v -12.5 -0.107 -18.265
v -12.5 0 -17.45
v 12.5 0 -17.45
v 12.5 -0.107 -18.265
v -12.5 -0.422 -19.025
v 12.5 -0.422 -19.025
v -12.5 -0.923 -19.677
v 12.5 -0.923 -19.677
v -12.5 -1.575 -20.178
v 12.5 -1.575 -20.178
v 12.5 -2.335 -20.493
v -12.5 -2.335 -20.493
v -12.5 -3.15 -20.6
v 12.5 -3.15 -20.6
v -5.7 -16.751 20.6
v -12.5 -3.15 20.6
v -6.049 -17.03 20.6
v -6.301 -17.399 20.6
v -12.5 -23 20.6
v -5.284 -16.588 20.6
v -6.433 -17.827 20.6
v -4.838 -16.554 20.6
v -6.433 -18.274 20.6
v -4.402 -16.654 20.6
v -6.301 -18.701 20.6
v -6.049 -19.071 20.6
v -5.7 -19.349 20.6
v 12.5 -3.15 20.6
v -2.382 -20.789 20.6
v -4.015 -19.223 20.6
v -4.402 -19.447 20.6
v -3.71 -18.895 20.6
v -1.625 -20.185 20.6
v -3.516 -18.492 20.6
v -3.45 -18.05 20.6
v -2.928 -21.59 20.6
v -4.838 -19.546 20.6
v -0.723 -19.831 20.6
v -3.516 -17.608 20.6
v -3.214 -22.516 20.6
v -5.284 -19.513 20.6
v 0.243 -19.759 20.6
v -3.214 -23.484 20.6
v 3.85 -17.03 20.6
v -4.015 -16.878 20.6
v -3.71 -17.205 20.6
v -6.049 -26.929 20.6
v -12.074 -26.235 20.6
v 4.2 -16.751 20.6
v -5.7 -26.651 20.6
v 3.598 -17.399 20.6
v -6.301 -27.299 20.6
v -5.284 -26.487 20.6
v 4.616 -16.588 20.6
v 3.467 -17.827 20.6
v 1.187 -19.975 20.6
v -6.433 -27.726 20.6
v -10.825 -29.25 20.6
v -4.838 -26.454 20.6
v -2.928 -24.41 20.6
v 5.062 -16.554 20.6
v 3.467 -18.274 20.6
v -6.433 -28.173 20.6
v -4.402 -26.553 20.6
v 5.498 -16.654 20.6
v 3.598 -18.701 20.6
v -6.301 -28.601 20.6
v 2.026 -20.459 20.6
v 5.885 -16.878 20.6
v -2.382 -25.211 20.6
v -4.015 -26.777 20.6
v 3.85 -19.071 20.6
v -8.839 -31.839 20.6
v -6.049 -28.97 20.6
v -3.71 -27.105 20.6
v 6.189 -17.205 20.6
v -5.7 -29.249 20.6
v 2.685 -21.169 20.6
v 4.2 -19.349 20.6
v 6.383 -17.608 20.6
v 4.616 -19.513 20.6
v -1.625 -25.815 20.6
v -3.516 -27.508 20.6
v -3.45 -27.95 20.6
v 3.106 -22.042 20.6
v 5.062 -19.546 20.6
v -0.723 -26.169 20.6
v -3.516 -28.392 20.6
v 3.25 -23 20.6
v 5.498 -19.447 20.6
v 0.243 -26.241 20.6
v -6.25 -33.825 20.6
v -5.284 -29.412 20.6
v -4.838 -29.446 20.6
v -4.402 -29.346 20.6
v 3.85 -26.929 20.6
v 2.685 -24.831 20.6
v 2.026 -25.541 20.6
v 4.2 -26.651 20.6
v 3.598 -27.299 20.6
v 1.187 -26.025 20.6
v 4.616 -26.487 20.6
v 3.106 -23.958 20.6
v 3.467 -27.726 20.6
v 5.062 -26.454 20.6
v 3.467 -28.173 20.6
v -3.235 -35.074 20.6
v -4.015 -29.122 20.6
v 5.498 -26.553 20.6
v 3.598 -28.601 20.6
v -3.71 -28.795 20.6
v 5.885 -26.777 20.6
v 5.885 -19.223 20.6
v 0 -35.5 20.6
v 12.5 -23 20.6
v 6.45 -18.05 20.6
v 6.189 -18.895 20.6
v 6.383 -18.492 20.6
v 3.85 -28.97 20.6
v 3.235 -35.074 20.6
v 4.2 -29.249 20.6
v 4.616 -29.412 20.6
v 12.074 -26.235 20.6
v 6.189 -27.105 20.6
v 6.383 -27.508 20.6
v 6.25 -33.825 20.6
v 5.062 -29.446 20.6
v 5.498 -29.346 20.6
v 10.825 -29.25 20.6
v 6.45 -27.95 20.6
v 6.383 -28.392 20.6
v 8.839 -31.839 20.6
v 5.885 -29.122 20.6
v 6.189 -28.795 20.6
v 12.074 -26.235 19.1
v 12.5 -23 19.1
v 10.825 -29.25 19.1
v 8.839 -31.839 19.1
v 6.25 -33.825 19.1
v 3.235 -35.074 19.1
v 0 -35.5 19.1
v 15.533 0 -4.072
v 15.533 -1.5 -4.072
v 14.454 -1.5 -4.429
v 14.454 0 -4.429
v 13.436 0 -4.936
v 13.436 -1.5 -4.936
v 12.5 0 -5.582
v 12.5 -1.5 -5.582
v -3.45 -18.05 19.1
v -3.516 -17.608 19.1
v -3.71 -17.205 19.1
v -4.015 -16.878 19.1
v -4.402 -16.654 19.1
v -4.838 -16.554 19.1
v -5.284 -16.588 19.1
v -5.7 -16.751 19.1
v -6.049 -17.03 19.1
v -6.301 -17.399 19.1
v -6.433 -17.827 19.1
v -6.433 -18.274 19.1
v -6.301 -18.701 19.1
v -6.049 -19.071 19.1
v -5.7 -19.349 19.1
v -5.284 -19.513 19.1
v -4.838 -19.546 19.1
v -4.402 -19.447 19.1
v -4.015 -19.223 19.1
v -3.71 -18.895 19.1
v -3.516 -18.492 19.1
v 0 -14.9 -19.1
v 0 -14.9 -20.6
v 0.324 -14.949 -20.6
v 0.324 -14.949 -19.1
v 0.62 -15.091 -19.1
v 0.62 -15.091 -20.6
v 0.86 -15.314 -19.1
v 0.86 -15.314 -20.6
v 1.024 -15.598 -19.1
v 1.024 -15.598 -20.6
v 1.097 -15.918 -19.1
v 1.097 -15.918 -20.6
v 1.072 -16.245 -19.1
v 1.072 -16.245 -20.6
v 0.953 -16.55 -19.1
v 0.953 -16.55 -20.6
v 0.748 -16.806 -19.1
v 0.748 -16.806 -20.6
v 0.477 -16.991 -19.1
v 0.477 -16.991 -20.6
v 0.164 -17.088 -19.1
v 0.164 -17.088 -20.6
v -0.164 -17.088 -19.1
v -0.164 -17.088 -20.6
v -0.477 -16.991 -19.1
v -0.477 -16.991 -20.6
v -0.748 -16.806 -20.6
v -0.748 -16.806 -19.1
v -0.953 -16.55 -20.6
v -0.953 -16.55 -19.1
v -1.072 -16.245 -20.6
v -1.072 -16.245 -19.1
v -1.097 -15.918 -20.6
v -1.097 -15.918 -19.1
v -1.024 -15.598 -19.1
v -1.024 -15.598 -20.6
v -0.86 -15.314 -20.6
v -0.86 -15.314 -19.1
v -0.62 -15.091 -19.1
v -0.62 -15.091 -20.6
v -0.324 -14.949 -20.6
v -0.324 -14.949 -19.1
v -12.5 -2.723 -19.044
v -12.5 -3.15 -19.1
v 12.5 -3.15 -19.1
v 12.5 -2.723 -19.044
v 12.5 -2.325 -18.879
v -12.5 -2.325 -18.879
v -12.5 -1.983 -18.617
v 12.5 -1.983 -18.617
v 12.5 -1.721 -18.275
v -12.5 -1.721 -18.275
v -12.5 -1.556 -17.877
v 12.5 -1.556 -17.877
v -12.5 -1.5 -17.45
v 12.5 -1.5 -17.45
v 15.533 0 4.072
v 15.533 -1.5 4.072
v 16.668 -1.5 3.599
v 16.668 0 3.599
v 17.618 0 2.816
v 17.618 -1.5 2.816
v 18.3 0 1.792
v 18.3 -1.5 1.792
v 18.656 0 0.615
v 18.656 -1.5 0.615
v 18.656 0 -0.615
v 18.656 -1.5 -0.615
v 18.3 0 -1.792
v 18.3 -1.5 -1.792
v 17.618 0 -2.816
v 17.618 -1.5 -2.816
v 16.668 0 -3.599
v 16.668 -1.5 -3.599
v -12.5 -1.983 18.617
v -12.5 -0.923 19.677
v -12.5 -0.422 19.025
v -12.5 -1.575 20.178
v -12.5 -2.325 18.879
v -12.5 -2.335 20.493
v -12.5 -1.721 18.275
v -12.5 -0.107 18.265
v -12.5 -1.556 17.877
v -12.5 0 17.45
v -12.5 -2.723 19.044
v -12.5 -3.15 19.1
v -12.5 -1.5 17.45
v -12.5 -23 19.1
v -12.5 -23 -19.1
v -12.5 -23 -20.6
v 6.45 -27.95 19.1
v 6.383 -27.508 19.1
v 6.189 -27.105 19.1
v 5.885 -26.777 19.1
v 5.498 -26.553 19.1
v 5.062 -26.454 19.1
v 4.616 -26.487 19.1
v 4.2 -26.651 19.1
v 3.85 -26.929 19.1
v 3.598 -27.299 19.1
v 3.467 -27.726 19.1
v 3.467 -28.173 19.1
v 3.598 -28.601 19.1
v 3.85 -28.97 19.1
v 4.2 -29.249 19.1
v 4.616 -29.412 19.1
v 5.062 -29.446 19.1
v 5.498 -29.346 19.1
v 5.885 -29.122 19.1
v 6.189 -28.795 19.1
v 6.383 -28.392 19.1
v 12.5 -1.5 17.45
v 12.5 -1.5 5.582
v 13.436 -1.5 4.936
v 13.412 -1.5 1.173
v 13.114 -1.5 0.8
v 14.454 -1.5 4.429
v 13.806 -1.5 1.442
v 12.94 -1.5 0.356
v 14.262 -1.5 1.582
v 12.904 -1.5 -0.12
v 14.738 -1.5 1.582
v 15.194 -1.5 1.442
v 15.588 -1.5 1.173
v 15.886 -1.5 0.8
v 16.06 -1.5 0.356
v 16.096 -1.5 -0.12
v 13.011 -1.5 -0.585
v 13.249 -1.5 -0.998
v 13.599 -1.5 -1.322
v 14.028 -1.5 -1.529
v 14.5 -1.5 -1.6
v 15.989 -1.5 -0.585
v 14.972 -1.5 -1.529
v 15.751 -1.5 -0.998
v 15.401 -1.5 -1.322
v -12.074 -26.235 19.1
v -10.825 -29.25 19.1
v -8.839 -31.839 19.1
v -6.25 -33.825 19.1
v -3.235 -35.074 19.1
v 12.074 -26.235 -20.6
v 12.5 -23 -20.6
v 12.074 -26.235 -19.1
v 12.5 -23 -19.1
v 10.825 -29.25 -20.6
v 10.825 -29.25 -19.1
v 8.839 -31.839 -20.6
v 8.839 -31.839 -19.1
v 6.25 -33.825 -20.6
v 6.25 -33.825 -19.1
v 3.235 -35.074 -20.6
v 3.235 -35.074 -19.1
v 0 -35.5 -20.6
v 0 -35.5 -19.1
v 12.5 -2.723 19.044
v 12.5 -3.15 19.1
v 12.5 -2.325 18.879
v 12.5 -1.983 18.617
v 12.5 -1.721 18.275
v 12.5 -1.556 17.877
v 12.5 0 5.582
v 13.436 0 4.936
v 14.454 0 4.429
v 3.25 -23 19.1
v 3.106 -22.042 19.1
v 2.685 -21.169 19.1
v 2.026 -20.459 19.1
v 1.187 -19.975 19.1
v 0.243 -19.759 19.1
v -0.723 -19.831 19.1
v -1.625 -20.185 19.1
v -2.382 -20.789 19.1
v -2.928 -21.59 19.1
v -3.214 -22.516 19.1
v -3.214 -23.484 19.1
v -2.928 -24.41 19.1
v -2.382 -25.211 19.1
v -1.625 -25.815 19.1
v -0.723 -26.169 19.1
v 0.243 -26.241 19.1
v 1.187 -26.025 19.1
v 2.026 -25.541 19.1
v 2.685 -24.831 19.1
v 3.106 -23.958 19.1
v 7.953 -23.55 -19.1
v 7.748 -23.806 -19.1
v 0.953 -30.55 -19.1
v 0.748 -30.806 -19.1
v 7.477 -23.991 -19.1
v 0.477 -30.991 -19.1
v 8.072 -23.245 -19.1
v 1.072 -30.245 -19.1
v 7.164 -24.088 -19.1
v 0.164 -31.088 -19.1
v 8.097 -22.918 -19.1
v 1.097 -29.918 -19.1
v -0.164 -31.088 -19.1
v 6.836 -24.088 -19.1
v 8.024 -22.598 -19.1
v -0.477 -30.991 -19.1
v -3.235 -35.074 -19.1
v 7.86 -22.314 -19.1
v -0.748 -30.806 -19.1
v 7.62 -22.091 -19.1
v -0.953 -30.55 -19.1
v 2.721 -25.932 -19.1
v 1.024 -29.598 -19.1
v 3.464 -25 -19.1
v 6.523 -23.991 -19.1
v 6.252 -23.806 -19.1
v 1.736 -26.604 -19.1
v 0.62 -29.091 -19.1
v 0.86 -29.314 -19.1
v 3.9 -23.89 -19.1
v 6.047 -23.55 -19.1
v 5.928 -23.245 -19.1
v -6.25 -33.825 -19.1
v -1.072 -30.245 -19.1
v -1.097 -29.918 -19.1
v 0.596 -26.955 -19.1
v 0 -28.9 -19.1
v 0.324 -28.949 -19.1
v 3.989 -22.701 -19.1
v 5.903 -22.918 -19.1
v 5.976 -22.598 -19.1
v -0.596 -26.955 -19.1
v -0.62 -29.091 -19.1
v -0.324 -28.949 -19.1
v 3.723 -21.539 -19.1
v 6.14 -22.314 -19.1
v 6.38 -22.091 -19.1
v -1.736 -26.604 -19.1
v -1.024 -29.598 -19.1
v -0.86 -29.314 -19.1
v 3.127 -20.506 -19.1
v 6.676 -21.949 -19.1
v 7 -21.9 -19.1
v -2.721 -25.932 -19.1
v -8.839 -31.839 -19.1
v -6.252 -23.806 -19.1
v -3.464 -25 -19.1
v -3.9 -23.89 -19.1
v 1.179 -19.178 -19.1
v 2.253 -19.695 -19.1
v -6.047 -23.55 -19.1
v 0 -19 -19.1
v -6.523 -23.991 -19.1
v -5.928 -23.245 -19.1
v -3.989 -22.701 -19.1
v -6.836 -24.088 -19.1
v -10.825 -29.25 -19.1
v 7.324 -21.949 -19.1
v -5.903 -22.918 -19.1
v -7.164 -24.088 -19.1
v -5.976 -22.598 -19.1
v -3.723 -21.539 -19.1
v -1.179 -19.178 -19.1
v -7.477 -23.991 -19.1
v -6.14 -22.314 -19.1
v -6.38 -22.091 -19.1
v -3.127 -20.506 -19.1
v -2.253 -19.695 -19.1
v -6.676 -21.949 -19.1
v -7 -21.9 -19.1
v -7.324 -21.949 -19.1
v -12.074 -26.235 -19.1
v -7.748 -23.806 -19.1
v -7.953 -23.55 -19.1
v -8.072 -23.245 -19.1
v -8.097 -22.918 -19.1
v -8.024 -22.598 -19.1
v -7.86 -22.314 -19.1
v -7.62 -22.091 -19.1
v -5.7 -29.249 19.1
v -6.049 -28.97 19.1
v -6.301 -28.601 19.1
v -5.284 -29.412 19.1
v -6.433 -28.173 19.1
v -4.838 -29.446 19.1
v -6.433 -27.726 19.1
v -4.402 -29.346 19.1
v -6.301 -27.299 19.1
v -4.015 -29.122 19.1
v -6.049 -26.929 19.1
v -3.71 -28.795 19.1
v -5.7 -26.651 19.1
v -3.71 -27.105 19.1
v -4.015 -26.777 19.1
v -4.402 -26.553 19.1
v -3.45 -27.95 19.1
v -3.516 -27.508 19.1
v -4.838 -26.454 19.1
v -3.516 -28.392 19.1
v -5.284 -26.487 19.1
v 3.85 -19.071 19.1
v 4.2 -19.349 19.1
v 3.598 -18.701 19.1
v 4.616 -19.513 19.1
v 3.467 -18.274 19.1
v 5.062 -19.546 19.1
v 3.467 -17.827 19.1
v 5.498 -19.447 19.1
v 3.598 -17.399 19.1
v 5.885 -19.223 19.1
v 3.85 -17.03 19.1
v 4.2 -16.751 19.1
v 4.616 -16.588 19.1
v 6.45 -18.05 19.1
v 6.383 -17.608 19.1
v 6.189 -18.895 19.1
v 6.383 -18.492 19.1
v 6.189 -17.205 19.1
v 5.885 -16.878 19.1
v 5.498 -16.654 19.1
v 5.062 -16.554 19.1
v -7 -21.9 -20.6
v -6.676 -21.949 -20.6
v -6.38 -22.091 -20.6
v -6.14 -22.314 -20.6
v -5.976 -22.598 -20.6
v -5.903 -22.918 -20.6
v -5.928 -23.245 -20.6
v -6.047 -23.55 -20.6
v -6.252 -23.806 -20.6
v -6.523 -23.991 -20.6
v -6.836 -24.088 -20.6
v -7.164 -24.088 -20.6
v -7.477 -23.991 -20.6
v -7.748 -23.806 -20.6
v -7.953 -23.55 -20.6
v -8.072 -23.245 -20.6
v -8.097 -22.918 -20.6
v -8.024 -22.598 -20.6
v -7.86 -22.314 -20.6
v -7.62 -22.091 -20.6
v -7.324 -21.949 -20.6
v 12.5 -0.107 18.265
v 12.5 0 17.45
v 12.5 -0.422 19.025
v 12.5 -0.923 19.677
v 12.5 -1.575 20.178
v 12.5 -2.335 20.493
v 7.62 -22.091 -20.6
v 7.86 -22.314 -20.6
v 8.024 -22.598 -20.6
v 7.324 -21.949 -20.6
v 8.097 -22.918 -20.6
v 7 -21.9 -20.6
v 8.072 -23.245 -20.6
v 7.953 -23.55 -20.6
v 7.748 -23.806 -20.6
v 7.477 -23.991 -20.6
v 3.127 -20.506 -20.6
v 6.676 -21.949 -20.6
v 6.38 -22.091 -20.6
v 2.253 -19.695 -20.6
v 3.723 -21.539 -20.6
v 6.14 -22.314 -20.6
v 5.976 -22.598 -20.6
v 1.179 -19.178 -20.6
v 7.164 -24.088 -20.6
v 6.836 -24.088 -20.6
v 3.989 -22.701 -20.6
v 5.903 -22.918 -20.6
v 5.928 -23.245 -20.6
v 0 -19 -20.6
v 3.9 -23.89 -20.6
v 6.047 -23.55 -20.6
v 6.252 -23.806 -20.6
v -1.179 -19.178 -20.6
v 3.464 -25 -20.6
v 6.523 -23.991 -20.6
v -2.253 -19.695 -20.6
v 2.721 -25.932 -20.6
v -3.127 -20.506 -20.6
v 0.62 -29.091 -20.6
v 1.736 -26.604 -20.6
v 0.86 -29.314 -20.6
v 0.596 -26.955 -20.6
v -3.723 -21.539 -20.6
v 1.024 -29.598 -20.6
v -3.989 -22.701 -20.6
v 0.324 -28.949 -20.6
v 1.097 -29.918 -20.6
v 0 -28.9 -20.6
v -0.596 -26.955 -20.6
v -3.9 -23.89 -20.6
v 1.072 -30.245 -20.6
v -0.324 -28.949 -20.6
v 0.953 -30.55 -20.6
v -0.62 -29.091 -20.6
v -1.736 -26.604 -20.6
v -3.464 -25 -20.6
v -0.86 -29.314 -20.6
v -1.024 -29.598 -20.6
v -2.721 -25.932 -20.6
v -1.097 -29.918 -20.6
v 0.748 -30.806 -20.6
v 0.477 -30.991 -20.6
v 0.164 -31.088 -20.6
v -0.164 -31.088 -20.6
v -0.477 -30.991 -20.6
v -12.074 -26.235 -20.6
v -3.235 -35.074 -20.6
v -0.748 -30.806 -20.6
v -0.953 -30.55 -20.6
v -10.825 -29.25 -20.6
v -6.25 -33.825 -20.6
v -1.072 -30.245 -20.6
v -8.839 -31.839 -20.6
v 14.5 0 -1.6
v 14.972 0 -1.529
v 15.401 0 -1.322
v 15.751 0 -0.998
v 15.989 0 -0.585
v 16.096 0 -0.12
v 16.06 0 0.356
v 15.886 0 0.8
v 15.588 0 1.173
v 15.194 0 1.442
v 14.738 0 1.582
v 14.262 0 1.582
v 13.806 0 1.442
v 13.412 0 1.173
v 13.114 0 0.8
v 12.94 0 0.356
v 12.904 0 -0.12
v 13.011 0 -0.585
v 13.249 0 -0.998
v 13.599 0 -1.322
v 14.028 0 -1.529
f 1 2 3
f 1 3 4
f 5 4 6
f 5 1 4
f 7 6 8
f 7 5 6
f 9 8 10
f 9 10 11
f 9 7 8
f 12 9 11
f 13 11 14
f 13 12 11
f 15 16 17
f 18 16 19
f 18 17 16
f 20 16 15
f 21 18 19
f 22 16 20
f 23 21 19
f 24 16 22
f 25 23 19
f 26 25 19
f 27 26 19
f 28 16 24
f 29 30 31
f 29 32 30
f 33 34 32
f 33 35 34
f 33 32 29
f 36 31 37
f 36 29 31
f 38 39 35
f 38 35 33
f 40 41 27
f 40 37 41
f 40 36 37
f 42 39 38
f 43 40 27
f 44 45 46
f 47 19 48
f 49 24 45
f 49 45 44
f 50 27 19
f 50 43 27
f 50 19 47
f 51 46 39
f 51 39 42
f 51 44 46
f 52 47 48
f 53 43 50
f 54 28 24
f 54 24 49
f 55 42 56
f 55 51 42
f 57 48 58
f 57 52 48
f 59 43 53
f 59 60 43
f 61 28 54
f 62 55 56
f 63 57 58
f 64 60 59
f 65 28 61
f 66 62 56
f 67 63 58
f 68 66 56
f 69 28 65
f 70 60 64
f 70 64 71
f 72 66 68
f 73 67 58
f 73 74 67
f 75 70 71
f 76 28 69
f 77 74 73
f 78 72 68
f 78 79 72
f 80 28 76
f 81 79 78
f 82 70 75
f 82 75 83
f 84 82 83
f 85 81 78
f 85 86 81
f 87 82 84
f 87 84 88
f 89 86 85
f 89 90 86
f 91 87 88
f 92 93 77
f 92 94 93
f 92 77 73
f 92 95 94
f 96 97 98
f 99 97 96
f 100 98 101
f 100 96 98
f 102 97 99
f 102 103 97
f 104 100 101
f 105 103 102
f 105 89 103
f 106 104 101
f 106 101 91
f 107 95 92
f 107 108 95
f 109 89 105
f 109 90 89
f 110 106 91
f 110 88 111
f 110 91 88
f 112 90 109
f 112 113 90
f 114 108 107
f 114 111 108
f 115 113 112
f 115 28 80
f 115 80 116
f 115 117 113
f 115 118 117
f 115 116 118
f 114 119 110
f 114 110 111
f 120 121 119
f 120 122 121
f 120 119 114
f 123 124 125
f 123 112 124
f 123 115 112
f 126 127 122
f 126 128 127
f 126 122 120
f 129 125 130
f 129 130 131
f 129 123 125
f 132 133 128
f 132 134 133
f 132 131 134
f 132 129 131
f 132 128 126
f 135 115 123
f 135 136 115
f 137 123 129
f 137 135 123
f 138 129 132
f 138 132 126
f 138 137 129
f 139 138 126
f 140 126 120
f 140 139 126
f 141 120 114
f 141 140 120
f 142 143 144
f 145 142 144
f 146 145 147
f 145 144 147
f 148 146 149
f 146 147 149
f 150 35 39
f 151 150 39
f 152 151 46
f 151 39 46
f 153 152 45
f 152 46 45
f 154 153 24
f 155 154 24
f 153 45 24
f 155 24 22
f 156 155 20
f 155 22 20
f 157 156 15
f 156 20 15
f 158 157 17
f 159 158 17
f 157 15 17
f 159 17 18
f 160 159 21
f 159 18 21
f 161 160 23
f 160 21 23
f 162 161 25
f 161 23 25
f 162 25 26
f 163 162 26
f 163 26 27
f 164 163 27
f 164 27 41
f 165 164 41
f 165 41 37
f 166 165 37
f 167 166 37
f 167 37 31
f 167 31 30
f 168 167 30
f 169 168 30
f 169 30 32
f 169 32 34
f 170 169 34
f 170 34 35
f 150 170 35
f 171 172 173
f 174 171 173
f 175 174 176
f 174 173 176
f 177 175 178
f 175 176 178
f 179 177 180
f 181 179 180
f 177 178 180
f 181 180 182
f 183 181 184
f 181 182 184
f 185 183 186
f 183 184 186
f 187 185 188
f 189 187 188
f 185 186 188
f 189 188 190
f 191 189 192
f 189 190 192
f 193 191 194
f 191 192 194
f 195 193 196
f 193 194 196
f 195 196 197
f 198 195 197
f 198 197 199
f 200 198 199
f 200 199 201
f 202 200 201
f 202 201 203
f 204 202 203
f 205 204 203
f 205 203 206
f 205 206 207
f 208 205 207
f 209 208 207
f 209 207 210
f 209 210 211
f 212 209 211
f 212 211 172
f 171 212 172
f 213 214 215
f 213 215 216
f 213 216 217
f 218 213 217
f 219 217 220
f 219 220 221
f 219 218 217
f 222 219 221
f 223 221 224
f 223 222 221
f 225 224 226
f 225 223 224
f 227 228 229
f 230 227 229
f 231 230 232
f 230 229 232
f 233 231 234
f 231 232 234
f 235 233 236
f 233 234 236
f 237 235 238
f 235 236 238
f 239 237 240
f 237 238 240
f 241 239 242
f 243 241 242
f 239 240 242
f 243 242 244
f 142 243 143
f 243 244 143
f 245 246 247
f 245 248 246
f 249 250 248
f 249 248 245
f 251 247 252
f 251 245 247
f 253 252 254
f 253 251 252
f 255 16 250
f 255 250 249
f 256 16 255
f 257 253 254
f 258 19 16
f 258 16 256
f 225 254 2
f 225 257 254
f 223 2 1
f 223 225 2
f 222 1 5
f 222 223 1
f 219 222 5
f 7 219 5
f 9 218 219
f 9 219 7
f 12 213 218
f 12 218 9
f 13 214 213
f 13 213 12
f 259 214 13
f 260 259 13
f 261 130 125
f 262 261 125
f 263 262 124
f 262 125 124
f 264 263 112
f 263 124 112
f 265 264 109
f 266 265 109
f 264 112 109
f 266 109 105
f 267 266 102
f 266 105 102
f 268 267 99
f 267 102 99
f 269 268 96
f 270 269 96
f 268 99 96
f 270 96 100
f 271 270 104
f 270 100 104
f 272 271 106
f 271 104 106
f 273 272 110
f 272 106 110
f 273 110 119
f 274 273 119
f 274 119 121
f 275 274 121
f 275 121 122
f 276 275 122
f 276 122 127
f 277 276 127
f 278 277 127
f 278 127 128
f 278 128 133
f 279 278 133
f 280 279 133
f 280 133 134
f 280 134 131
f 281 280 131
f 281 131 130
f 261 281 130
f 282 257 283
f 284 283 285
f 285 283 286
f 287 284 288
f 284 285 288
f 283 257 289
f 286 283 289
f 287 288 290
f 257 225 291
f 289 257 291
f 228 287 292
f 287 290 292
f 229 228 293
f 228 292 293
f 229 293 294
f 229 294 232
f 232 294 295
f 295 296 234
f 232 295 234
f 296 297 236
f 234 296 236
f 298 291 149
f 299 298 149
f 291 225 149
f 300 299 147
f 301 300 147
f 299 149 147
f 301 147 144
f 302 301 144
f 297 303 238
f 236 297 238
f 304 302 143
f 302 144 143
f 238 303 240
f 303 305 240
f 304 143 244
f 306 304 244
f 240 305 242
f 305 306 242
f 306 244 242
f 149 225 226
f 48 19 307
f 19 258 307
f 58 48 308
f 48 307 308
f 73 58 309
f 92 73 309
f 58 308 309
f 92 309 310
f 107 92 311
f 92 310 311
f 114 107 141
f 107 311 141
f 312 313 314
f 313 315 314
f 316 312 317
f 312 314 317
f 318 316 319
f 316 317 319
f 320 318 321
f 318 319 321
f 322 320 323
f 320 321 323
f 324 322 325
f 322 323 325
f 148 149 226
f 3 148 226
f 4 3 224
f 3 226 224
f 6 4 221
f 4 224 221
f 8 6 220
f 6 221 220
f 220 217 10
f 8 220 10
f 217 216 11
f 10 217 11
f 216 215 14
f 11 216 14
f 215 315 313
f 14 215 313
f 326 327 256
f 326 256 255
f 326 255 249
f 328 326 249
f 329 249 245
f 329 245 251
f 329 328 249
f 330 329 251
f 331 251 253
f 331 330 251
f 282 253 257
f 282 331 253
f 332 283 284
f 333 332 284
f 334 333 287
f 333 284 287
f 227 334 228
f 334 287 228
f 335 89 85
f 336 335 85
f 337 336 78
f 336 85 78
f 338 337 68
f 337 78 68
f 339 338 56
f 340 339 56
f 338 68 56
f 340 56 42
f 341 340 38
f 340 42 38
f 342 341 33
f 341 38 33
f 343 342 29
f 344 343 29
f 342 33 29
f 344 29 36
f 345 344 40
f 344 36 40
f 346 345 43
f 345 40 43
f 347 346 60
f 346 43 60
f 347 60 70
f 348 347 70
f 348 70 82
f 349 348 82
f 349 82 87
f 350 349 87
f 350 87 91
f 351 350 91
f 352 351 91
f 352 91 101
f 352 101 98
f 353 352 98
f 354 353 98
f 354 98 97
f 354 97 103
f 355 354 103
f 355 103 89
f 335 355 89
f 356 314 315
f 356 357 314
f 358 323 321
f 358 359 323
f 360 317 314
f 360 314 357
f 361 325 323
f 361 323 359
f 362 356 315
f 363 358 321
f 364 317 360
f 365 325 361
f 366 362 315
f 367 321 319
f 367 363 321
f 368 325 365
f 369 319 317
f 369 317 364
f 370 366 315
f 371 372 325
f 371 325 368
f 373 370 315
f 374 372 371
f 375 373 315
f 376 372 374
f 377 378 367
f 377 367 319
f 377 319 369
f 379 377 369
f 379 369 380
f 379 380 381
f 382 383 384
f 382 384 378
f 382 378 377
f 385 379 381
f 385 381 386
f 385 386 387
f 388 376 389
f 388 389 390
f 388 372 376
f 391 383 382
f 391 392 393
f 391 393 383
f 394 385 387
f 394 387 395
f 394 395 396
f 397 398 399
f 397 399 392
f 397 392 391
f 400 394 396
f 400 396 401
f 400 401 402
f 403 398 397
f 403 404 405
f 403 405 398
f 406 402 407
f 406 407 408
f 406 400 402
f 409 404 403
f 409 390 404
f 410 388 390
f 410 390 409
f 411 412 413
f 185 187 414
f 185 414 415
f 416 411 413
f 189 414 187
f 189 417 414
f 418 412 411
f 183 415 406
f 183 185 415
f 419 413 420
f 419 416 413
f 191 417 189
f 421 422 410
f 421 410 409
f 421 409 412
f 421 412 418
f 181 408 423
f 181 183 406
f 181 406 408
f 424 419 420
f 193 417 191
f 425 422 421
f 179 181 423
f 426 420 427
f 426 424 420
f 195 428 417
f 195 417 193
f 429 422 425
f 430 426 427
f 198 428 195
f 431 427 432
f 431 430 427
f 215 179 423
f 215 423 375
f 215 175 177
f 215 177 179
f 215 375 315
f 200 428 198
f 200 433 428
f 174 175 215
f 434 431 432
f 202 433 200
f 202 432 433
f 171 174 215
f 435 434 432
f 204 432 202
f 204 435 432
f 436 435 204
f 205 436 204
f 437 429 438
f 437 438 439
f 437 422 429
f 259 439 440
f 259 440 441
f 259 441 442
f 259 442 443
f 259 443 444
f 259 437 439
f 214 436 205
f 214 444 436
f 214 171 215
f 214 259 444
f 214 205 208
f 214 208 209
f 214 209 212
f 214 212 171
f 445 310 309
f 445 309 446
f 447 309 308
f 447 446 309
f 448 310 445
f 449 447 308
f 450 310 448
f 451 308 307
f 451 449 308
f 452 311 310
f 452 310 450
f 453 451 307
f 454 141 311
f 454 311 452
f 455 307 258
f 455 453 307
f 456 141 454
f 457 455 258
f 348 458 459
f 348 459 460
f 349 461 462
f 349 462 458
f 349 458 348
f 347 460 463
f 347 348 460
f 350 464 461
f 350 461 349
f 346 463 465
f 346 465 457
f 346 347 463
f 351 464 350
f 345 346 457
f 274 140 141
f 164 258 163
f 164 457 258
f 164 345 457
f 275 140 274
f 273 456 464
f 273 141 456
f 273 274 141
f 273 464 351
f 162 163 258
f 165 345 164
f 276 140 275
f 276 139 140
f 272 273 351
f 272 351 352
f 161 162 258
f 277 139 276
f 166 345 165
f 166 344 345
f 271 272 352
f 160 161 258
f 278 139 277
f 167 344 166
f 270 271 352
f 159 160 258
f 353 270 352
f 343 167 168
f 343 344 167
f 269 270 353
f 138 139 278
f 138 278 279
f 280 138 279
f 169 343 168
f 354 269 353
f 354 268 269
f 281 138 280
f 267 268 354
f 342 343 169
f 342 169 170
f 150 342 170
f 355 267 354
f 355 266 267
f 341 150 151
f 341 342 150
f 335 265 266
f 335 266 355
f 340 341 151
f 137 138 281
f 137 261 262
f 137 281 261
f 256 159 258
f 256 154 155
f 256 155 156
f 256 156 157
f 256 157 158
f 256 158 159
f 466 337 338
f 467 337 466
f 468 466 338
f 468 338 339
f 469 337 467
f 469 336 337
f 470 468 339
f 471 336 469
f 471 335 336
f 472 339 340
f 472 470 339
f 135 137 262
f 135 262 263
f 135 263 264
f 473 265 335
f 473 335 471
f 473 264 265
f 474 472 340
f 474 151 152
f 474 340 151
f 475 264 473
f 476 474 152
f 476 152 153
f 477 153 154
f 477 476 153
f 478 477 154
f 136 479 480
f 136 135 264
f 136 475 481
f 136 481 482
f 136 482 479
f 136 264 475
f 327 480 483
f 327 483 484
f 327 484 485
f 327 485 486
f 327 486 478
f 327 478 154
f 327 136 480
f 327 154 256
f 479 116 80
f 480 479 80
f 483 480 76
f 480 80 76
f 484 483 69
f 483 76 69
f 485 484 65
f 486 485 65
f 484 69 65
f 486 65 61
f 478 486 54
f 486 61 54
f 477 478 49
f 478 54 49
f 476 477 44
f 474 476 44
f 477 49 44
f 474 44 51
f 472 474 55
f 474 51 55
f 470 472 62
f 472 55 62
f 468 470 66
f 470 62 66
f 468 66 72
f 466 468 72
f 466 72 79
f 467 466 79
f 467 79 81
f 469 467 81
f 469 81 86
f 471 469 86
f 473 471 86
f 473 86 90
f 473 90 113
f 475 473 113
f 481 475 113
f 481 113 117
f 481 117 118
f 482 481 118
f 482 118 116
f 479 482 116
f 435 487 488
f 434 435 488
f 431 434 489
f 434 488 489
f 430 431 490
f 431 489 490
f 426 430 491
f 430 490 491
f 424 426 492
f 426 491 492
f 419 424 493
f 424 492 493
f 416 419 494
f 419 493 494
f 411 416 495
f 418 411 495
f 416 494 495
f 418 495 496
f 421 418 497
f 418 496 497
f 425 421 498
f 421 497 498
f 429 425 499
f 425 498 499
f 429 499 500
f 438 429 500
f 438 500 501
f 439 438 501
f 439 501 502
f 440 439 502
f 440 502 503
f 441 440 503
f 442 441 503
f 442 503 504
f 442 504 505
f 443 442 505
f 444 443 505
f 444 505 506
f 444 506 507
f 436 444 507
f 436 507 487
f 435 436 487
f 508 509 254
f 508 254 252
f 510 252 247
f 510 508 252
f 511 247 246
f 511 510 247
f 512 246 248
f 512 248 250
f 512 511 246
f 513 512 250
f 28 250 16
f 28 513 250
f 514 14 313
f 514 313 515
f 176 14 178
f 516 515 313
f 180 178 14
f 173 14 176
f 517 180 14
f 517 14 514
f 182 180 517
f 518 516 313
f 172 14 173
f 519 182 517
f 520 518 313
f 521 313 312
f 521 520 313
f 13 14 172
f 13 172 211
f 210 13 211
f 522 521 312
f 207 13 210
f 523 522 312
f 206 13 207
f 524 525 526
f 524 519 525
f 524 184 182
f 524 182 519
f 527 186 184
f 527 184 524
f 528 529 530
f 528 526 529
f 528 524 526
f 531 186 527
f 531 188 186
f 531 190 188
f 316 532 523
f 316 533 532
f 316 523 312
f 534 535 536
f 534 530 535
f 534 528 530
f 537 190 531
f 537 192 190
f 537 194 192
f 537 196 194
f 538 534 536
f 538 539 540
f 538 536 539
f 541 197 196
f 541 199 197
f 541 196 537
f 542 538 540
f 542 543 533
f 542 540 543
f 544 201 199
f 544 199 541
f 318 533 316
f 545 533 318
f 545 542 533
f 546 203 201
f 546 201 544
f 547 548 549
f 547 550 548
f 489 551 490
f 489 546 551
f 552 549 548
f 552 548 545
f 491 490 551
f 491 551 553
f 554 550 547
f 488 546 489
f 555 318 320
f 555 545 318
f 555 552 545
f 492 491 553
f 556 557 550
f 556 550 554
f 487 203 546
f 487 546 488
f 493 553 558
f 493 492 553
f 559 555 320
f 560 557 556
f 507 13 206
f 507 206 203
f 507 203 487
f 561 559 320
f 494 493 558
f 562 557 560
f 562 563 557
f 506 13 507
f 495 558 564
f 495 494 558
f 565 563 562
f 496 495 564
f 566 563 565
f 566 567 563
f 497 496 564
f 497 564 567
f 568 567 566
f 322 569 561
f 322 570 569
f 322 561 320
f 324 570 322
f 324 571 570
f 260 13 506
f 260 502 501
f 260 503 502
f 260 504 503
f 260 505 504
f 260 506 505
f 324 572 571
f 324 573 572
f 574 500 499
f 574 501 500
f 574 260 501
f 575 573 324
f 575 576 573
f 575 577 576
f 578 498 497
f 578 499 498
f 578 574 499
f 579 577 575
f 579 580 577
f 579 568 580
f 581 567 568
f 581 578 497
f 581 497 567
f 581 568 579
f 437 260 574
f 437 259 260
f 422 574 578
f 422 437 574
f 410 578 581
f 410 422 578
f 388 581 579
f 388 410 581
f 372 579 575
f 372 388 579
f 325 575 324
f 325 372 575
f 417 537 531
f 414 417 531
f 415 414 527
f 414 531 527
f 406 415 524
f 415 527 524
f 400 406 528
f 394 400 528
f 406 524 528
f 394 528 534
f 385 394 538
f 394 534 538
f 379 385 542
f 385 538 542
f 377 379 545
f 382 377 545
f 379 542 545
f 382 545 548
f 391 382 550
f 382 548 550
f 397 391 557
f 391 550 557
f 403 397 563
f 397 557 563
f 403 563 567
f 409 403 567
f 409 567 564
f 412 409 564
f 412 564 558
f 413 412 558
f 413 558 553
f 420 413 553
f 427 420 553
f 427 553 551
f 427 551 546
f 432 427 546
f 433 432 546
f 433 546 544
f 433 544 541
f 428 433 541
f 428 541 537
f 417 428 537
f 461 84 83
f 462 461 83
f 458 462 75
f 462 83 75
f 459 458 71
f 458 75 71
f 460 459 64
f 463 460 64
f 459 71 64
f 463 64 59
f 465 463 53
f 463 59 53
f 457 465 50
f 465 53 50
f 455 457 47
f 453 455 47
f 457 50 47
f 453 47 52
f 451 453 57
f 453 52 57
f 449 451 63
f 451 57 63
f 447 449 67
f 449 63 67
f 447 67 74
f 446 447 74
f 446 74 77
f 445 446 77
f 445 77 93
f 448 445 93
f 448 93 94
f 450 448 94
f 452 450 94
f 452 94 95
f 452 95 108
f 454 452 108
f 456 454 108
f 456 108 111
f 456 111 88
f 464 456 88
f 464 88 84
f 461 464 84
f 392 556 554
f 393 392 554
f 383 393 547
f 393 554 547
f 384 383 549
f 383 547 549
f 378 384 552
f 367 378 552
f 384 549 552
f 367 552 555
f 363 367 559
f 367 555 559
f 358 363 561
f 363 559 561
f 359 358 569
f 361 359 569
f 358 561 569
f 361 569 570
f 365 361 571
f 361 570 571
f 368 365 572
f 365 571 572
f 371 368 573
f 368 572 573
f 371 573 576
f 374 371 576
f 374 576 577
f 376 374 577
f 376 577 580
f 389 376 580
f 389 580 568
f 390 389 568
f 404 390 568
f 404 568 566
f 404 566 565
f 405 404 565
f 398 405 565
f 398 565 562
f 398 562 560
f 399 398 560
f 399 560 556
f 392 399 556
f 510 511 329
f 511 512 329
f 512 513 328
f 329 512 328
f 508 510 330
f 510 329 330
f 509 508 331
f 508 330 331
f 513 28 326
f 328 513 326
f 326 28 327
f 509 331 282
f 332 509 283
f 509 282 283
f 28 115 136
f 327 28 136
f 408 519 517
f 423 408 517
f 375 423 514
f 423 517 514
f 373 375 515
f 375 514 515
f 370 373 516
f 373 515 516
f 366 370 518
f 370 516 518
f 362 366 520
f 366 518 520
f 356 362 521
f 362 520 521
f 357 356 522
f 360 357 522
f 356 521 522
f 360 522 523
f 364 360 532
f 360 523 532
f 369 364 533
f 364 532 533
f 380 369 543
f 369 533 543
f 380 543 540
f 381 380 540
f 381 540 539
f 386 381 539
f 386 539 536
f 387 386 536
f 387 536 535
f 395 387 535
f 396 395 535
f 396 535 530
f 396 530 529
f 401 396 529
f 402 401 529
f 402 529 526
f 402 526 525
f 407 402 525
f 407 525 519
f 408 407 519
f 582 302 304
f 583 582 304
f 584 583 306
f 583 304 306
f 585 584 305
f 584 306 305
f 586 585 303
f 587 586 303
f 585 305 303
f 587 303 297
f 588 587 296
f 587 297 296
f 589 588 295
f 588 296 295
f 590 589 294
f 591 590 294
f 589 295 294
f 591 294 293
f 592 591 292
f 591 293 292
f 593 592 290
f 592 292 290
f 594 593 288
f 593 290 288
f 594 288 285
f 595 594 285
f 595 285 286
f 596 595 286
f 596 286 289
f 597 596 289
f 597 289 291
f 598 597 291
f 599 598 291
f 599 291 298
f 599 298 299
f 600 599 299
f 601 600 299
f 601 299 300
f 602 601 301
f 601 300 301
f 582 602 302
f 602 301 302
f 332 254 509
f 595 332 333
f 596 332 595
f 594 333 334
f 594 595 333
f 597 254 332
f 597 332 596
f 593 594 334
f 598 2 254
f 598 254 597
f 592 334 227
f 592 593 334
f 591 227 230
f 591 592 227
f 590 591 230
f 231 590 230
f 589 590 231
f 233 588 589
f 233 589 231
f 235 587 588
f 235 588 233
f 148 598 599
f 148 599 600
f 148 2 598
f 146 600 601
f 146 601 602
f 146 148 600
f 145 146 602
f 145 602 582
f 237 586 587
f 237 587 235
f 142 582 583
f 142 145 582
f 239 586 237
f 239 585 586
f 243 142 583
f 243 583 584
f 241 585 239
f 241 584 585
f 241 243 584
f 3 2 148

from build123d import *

# Parameters (mm, degrees)
SKETCH1_W                      = 25
SKETCH1_H                      = 38.2
BASE_FLANGE1_DEPTH             = 1.5
EDGE_FLANGE1_STRIP_W           = 9.3
EDGE_FLANGE1_STRIP_H           = 1.5
EDGE_FLANGE1_STRIP_CUT_DEPTH   = 25
EDGE_FLANGE1_STRIP_2_W         = 9.3
EDGE_FLANGE1_STRIP_2_H         = 1.5
EDGE_FLANGE1_STRIP_CUT_2_DEPTH = 25
EDGE_FLANGE1_DEPTH             = 25
EDGE_FLANGE1_BEND_DEPTH        = 25
CUT_EXTRUDE1_REACH             = 57.803
SKETCH12_R                     = 1.5
SKETCH12_R_2                   = 3.25
CUT_EXTRUDE2_REACH             = 57.803
SKETCH13_R                     = 4
SKETCH13_R_2                   = 1.1
FILLET1_R                      = 12.5
SKETCH14_R                     = 1.6
TAB1_DEPTH                     = 1.5


# Sheet-metal steps are written as plain solids
with BuildPart() as part:
    # Sketch1 → Base-Flange1 (new body)
    with BuildSketch(Plane(origin=(0, 0, 0), x_dir=(1, 0, 0), z_dir=(0, 1, 0))):
        Rectangle(SKETCH1_W, SKETCH1_H)
    extrude(amount=-BASE_FLANGE1_DEPTH)

    # Edge-Flange1 strip (across the edge) → Edge-Flange1 strip cut (cut)
    with BuildSketch(Plane(origin=(12.5, -1.5, 19.1), x_dir=(0, 0, -1), z_dir=(-1, 0, 0))):
        with Locations((-3, -0.75)):
            Rectangle(EDGE_FLANGE1_STRIP_W, EDGE_FLANGE1_STRIP_H)
    extrude(amount=EDGE_FLANGE1_STRIP_CUT_DEPTH, mode=Mode.SUBTRACT)

    # Edge-Flange1 strip 2 (across the edge) → Edge-Flange1 strip cut 2 (cut)
    with BuildSketch(Plane(origin=(-12.5, -1.5, -19.1), x_dir=(0, 0, 1), z_dir=(1, 0, 0))):
        with Locations((-3, -0.75)):
            Rectangle(EDGE_FLANGE1_STRIP_2_W, EDGE_FLANGE1_STRIP_2_H)
    extrude(amount=EDGE_FLANGE1_STRIP_CUT_2_DEPTH, mode=Mode.SUBTRACT)

    # Edge-Flange1 section (across the edge) → Edge-Flange1 (add)
    with BuildSketch(Plane(origin=(12.5, -1.5, 19.1), x_dir=(0, 0, -1), z_dir=(-1, 0, 0))):
        with BuildLine():
            Line((-1.5, 1.65), (-1.5, 34))
            Line((-1.5, 34), (0, 34))
            Line((0, 34), (0, 1.65))
            ThreePointArc((0, 1.65), (0.483273811, 0.483273811), (1.65, 0))
            Line((1.65, 0), (1.65, -1.5))
            ThreePointArc((1.65, -1.5), (-0.577386361, -0.577386361), (-1.5, 1.65))
        make_face()
    extrude(amount=EDGE_FLANGE1_DEPTH)

    # Edge-Flange1 section 2 (across the edge) → Edge-Flange1 bend (add)
    with BuildSketch(Plane(origin=(-12.5, -1.5, -19.1), x_dir=(0, 0, 1), z_dir=(1, 0, 0))):
        with BuildLine():
            Line((-1.5, 1.65), (-1.5, 34))
            Line((-1.5, 34), (0, 34))
            Line((0, 34), (0, 1.65))
            ThreePointArc((0, 1.65), (0.483273811, 0.483273811), (1.65, 0))
            Line((1.65, 0), (1.65, -1.5))
            ThreePointArc((1.65, -1.5), (-0.577386361, -0.577386361), (-1.5, 1.65))
        make_face()
    extrude(amount=EDGE_FLANGE1_BEND_DEPTH)

    # Sketch12 → Cut-Extrude1 (cut, up to next)
    with BuildSketch(Plane.XY.offset(20.6), mode=Mode.PRIVATE) as cut_extrude1_sk1:
        with Locations((-4.949747468, -18.050252532)):
            Circle(SKETCH12_R)
    cut_extrude1_tool1 = extrude(cut_extrude1_sk1.sketch, amount=-CUT_EXTRUDE1_REACH, mode=Mode.PRIVATE) & part.part
    # Sketch12 → Cut-Extrude1 (cut, up to next)
    with BuildSketch(Plane.XY.offset(20.6), mode=Mode.PRIVATE) as cut_extrude1_sk2:
        with Locations((4.949747468, -18.050252532)):
            Circle(SKETCH12_R)
    cut_extrude1_tool2 = extrude(cut_extrude1_sk2.sketch, amount=-CUT_EXTRUDE1_REACH, mode=Mode.PRIVATE) & part.part
    # Sketch12 → Cut-Extrude1 (cut, up to next)
    with BuildSketch(Plane.XY.offset(20.6), mode=Mode.PRIVATE) as cut_extrude1_sk3:
        with Locations((-4.949747468, -27.949747468)):
            Circle(SKETCH12_R)
    cut_extrude1_tool3 = extrude(cut_extrude1_sk3.sketch, amount=-CUT_EXTRUDE1_REACH, mode=Mode.PRIVATE) & part.part
    # Sketch12 → Cut-Extrude1 (cut, up to next)
    with BuildSketch(Plane.XY.offset(20.6), mode=Mode.PRIVATE) as cut_extrude1_sk4:
        with Locations((4.949747468, -27.949747468)):
            Circle(SKETCH12_R)
    cut_extrude1_tool4 = extrude(cut_extrude1_sk4.sketch, amount=-CUT_EXTRUDE1_REACH, mode=Mode.PRIVATE) & part.part
    # Sketch12 → Cut-Extrude1 (cut, up to next)
    with BuildSketch(Plane.XY.offset(20.6), mode=Mode.PRIVATE) as cut_extrude1_sk5:
        with Locations((0, -23)):
            Circle(SKETCH12_R_2)
    cut_extrude1_tool5 = extrude(cut_extrude1_sk5.sketch, amount=-CUT_EXTRUDE1_REACH, mode=Mode.PRIVATE) & part.part
    add(cut_extrude1_tool1.solids().sort_by_distance((-4.949747, -18.050253, 20.6))[0], mode=Mode.SUBTRACT)
    add(cut_extrude1_tool2.solids().sort_by_distance((4.949747, -18.050253, 20.6))[0], mode=Mode.SUBTRACT)
    add(cut_extrude1_tool3.solids().sort_by_distance((-4.949747, -27.949747, 20.6))[0], mode=Mode.SUBTRACT)
    add(cut_extrude1_tool4.solids().sort_by_distance((4.949747, -27.949747, 20.6))[0], mode=Mode.SUBTRACT)
    add(cut_extrude1_tool5.solids().sort_by_distance((0, -23, 20.6))[0], mode=Mode.SUBTRACT)

    # Sketch13 → Cut-Extrude2 (cut, up to next)
    with BuildSketch(Plane(origin=(0, 0, -20.6), x_dir=(-1, 0, 0), z_dir=(0, 0, -1)), mode=Mode.PRIVATE) as cut_extrude2_sk1:
        with Locations(Location((0, -23, 0), (0, 0, 90))):
            Circle(SKETCH13_R)
    cut_extrude2_tool1 = extrude(cut_extrude2_sk1.sketch, amount=-CUT_EXTRUDE2_REACH, mode=Mode.PRIVATE) & part.part
    # Sketch13 → Cut-Extrude2 (cut, up to next)
    with BuildSketch(Plane(origin=(0, 0, -20.6), x_dir=(-1, 0, 0), z_dir=(0, 0, -1)), mode=Mode.PRIVATE) as cut_extrude2_sk2:
        with Locations(Location((0, -30, 0), (0, 0, 90))):
            Circle(SKETCH13_R_2)
    cut_extrude2_tool2 = extrude(cut_extrude2_sk2.sketch, amount=-CUT_EXTRUDE2_REACH, mode=Mode.PRIVATE) & part.part
    # Sketch13 → Cut-Extrude2 (cut, up to next)
    with BuildSketch(Plane(origin=(0, 0, -20.6), x_dir=(-1, 0, 0), z_dir=(0, 0, -1)), mode=Mode.PRIVATE) as cut_extrude2_sk3:
        with Locations(Location((-7, -23, 0), (0, 0, 90))):
            Circle(SKETCH13_R_2)
    cut_extrude2_tool3 = extrude(cut_extrude2_sk3.sketch, amount=-CUT_EXTRUDE2_REACH, mode=Mode.PRIVATE) & part.part
    # Sketch13 → Cut-Extrude2 (cut, up to next)
    with BuildSketch(Plane(origin=(0, 0, -20.6), x_dir=(-1, 0, 0), z_dir=(0, 0, -1)), mode=Mode.PRIVATE) as cut_extrude2_sk4:
        with Locations(Location((0, -16, 0), (0, 0, 90))):
            Circle(SKETCH13_R_2)
    cut_extrude2_tool4 = extrude(cut_extrude2_sk4.sketch, amount=-CUT_EXTRUDE2_REACH, mode=Mode.PRIVATE) & part.part
    # Sketch13 → Cut-Extrude2 (cut, up to next)
    with BuildSketch(Plane(origin=(0, 0, -20.6), x_dir=(-1, 0, 0), z_dir=(0, 0, -1)), mode=Mode.PRIVATE) as cut_extrude2_sk5:
        with Locations(Location((7, -23, 0), (0, 0, 90))):
            Circle(SKETCH13_R_2)
    cut_extrude2_tool5 = extrude(cut_extrude2_sk5.sketch, amount=-CUT_EXTRUDE2_REACH, mode=Mode.PRIVATE) & part.part
    add(cut_extrude2_tool1.solids().sort_by_distance((0, -23, -20.6))[0], mode=Mode.SUBTRACT)
    add(cut_extrude2_tool2.solids().sort_by_distance((0, -30, -20.6))[0], mode=Mode.SUBTRACT)
    add(cut_extrude2_tool3.solids().sort_by_distance((7, -23, -20.6))[0], mode=Mode.SUBTRACT)
    add(cut_extrude2_tool4.solids().sort_by_distance((0, -16, -20.6))[0], mode=Mode.SUBTRACT)
    add(cut_extrude2_tool5.solids().sort_by_distance((-7, -23, -20.6))[0], mode=Mode.SUBTRACT)

    # Fillet1
    fillet1_edges = [part.edges().sort_by_distance(p)[0] for p in [
        (12.5, -35.5, 19.85),
        (-12.5, -35.5, 19.85),
        (-12.5, -35.5, -19.85),
        (12.5, -35.5, -19.85),
    ]]
    fillet(fillet1_edges, radius=FILLET1_R - 0.0001)  # a hair under: the kernel refuses the full size

    # Sketch14 → Tab1 (add)
    with BuildSketch(Plane.XZ.offset(1.5)):
        with BuildLine():
            Line((12.5, -5.581701947), (12.5, 5.581701947))
            ThreePointArc((12.5, 5.581701947), (13.935678731, 4.66460431), (15.532990604, 4.072289972))
            ThreePointArc((15.532990604, 4.072289972), (18.701263524, 0), (15.532990604, -4.072289972))
            ThreePointArc((15.532990604, -4.072289972), (13.935678731, -4.66460431), (12.5, -5.581701947))
        make_face()
        with Locations(Location((14.5, 0, 0), (0, 0, 270))):
            Circle(SKETCH14_R, mode=Mode.SUBTRACT)
    extrude(amount=-TAB1_DEPTH)


solid = part.part
